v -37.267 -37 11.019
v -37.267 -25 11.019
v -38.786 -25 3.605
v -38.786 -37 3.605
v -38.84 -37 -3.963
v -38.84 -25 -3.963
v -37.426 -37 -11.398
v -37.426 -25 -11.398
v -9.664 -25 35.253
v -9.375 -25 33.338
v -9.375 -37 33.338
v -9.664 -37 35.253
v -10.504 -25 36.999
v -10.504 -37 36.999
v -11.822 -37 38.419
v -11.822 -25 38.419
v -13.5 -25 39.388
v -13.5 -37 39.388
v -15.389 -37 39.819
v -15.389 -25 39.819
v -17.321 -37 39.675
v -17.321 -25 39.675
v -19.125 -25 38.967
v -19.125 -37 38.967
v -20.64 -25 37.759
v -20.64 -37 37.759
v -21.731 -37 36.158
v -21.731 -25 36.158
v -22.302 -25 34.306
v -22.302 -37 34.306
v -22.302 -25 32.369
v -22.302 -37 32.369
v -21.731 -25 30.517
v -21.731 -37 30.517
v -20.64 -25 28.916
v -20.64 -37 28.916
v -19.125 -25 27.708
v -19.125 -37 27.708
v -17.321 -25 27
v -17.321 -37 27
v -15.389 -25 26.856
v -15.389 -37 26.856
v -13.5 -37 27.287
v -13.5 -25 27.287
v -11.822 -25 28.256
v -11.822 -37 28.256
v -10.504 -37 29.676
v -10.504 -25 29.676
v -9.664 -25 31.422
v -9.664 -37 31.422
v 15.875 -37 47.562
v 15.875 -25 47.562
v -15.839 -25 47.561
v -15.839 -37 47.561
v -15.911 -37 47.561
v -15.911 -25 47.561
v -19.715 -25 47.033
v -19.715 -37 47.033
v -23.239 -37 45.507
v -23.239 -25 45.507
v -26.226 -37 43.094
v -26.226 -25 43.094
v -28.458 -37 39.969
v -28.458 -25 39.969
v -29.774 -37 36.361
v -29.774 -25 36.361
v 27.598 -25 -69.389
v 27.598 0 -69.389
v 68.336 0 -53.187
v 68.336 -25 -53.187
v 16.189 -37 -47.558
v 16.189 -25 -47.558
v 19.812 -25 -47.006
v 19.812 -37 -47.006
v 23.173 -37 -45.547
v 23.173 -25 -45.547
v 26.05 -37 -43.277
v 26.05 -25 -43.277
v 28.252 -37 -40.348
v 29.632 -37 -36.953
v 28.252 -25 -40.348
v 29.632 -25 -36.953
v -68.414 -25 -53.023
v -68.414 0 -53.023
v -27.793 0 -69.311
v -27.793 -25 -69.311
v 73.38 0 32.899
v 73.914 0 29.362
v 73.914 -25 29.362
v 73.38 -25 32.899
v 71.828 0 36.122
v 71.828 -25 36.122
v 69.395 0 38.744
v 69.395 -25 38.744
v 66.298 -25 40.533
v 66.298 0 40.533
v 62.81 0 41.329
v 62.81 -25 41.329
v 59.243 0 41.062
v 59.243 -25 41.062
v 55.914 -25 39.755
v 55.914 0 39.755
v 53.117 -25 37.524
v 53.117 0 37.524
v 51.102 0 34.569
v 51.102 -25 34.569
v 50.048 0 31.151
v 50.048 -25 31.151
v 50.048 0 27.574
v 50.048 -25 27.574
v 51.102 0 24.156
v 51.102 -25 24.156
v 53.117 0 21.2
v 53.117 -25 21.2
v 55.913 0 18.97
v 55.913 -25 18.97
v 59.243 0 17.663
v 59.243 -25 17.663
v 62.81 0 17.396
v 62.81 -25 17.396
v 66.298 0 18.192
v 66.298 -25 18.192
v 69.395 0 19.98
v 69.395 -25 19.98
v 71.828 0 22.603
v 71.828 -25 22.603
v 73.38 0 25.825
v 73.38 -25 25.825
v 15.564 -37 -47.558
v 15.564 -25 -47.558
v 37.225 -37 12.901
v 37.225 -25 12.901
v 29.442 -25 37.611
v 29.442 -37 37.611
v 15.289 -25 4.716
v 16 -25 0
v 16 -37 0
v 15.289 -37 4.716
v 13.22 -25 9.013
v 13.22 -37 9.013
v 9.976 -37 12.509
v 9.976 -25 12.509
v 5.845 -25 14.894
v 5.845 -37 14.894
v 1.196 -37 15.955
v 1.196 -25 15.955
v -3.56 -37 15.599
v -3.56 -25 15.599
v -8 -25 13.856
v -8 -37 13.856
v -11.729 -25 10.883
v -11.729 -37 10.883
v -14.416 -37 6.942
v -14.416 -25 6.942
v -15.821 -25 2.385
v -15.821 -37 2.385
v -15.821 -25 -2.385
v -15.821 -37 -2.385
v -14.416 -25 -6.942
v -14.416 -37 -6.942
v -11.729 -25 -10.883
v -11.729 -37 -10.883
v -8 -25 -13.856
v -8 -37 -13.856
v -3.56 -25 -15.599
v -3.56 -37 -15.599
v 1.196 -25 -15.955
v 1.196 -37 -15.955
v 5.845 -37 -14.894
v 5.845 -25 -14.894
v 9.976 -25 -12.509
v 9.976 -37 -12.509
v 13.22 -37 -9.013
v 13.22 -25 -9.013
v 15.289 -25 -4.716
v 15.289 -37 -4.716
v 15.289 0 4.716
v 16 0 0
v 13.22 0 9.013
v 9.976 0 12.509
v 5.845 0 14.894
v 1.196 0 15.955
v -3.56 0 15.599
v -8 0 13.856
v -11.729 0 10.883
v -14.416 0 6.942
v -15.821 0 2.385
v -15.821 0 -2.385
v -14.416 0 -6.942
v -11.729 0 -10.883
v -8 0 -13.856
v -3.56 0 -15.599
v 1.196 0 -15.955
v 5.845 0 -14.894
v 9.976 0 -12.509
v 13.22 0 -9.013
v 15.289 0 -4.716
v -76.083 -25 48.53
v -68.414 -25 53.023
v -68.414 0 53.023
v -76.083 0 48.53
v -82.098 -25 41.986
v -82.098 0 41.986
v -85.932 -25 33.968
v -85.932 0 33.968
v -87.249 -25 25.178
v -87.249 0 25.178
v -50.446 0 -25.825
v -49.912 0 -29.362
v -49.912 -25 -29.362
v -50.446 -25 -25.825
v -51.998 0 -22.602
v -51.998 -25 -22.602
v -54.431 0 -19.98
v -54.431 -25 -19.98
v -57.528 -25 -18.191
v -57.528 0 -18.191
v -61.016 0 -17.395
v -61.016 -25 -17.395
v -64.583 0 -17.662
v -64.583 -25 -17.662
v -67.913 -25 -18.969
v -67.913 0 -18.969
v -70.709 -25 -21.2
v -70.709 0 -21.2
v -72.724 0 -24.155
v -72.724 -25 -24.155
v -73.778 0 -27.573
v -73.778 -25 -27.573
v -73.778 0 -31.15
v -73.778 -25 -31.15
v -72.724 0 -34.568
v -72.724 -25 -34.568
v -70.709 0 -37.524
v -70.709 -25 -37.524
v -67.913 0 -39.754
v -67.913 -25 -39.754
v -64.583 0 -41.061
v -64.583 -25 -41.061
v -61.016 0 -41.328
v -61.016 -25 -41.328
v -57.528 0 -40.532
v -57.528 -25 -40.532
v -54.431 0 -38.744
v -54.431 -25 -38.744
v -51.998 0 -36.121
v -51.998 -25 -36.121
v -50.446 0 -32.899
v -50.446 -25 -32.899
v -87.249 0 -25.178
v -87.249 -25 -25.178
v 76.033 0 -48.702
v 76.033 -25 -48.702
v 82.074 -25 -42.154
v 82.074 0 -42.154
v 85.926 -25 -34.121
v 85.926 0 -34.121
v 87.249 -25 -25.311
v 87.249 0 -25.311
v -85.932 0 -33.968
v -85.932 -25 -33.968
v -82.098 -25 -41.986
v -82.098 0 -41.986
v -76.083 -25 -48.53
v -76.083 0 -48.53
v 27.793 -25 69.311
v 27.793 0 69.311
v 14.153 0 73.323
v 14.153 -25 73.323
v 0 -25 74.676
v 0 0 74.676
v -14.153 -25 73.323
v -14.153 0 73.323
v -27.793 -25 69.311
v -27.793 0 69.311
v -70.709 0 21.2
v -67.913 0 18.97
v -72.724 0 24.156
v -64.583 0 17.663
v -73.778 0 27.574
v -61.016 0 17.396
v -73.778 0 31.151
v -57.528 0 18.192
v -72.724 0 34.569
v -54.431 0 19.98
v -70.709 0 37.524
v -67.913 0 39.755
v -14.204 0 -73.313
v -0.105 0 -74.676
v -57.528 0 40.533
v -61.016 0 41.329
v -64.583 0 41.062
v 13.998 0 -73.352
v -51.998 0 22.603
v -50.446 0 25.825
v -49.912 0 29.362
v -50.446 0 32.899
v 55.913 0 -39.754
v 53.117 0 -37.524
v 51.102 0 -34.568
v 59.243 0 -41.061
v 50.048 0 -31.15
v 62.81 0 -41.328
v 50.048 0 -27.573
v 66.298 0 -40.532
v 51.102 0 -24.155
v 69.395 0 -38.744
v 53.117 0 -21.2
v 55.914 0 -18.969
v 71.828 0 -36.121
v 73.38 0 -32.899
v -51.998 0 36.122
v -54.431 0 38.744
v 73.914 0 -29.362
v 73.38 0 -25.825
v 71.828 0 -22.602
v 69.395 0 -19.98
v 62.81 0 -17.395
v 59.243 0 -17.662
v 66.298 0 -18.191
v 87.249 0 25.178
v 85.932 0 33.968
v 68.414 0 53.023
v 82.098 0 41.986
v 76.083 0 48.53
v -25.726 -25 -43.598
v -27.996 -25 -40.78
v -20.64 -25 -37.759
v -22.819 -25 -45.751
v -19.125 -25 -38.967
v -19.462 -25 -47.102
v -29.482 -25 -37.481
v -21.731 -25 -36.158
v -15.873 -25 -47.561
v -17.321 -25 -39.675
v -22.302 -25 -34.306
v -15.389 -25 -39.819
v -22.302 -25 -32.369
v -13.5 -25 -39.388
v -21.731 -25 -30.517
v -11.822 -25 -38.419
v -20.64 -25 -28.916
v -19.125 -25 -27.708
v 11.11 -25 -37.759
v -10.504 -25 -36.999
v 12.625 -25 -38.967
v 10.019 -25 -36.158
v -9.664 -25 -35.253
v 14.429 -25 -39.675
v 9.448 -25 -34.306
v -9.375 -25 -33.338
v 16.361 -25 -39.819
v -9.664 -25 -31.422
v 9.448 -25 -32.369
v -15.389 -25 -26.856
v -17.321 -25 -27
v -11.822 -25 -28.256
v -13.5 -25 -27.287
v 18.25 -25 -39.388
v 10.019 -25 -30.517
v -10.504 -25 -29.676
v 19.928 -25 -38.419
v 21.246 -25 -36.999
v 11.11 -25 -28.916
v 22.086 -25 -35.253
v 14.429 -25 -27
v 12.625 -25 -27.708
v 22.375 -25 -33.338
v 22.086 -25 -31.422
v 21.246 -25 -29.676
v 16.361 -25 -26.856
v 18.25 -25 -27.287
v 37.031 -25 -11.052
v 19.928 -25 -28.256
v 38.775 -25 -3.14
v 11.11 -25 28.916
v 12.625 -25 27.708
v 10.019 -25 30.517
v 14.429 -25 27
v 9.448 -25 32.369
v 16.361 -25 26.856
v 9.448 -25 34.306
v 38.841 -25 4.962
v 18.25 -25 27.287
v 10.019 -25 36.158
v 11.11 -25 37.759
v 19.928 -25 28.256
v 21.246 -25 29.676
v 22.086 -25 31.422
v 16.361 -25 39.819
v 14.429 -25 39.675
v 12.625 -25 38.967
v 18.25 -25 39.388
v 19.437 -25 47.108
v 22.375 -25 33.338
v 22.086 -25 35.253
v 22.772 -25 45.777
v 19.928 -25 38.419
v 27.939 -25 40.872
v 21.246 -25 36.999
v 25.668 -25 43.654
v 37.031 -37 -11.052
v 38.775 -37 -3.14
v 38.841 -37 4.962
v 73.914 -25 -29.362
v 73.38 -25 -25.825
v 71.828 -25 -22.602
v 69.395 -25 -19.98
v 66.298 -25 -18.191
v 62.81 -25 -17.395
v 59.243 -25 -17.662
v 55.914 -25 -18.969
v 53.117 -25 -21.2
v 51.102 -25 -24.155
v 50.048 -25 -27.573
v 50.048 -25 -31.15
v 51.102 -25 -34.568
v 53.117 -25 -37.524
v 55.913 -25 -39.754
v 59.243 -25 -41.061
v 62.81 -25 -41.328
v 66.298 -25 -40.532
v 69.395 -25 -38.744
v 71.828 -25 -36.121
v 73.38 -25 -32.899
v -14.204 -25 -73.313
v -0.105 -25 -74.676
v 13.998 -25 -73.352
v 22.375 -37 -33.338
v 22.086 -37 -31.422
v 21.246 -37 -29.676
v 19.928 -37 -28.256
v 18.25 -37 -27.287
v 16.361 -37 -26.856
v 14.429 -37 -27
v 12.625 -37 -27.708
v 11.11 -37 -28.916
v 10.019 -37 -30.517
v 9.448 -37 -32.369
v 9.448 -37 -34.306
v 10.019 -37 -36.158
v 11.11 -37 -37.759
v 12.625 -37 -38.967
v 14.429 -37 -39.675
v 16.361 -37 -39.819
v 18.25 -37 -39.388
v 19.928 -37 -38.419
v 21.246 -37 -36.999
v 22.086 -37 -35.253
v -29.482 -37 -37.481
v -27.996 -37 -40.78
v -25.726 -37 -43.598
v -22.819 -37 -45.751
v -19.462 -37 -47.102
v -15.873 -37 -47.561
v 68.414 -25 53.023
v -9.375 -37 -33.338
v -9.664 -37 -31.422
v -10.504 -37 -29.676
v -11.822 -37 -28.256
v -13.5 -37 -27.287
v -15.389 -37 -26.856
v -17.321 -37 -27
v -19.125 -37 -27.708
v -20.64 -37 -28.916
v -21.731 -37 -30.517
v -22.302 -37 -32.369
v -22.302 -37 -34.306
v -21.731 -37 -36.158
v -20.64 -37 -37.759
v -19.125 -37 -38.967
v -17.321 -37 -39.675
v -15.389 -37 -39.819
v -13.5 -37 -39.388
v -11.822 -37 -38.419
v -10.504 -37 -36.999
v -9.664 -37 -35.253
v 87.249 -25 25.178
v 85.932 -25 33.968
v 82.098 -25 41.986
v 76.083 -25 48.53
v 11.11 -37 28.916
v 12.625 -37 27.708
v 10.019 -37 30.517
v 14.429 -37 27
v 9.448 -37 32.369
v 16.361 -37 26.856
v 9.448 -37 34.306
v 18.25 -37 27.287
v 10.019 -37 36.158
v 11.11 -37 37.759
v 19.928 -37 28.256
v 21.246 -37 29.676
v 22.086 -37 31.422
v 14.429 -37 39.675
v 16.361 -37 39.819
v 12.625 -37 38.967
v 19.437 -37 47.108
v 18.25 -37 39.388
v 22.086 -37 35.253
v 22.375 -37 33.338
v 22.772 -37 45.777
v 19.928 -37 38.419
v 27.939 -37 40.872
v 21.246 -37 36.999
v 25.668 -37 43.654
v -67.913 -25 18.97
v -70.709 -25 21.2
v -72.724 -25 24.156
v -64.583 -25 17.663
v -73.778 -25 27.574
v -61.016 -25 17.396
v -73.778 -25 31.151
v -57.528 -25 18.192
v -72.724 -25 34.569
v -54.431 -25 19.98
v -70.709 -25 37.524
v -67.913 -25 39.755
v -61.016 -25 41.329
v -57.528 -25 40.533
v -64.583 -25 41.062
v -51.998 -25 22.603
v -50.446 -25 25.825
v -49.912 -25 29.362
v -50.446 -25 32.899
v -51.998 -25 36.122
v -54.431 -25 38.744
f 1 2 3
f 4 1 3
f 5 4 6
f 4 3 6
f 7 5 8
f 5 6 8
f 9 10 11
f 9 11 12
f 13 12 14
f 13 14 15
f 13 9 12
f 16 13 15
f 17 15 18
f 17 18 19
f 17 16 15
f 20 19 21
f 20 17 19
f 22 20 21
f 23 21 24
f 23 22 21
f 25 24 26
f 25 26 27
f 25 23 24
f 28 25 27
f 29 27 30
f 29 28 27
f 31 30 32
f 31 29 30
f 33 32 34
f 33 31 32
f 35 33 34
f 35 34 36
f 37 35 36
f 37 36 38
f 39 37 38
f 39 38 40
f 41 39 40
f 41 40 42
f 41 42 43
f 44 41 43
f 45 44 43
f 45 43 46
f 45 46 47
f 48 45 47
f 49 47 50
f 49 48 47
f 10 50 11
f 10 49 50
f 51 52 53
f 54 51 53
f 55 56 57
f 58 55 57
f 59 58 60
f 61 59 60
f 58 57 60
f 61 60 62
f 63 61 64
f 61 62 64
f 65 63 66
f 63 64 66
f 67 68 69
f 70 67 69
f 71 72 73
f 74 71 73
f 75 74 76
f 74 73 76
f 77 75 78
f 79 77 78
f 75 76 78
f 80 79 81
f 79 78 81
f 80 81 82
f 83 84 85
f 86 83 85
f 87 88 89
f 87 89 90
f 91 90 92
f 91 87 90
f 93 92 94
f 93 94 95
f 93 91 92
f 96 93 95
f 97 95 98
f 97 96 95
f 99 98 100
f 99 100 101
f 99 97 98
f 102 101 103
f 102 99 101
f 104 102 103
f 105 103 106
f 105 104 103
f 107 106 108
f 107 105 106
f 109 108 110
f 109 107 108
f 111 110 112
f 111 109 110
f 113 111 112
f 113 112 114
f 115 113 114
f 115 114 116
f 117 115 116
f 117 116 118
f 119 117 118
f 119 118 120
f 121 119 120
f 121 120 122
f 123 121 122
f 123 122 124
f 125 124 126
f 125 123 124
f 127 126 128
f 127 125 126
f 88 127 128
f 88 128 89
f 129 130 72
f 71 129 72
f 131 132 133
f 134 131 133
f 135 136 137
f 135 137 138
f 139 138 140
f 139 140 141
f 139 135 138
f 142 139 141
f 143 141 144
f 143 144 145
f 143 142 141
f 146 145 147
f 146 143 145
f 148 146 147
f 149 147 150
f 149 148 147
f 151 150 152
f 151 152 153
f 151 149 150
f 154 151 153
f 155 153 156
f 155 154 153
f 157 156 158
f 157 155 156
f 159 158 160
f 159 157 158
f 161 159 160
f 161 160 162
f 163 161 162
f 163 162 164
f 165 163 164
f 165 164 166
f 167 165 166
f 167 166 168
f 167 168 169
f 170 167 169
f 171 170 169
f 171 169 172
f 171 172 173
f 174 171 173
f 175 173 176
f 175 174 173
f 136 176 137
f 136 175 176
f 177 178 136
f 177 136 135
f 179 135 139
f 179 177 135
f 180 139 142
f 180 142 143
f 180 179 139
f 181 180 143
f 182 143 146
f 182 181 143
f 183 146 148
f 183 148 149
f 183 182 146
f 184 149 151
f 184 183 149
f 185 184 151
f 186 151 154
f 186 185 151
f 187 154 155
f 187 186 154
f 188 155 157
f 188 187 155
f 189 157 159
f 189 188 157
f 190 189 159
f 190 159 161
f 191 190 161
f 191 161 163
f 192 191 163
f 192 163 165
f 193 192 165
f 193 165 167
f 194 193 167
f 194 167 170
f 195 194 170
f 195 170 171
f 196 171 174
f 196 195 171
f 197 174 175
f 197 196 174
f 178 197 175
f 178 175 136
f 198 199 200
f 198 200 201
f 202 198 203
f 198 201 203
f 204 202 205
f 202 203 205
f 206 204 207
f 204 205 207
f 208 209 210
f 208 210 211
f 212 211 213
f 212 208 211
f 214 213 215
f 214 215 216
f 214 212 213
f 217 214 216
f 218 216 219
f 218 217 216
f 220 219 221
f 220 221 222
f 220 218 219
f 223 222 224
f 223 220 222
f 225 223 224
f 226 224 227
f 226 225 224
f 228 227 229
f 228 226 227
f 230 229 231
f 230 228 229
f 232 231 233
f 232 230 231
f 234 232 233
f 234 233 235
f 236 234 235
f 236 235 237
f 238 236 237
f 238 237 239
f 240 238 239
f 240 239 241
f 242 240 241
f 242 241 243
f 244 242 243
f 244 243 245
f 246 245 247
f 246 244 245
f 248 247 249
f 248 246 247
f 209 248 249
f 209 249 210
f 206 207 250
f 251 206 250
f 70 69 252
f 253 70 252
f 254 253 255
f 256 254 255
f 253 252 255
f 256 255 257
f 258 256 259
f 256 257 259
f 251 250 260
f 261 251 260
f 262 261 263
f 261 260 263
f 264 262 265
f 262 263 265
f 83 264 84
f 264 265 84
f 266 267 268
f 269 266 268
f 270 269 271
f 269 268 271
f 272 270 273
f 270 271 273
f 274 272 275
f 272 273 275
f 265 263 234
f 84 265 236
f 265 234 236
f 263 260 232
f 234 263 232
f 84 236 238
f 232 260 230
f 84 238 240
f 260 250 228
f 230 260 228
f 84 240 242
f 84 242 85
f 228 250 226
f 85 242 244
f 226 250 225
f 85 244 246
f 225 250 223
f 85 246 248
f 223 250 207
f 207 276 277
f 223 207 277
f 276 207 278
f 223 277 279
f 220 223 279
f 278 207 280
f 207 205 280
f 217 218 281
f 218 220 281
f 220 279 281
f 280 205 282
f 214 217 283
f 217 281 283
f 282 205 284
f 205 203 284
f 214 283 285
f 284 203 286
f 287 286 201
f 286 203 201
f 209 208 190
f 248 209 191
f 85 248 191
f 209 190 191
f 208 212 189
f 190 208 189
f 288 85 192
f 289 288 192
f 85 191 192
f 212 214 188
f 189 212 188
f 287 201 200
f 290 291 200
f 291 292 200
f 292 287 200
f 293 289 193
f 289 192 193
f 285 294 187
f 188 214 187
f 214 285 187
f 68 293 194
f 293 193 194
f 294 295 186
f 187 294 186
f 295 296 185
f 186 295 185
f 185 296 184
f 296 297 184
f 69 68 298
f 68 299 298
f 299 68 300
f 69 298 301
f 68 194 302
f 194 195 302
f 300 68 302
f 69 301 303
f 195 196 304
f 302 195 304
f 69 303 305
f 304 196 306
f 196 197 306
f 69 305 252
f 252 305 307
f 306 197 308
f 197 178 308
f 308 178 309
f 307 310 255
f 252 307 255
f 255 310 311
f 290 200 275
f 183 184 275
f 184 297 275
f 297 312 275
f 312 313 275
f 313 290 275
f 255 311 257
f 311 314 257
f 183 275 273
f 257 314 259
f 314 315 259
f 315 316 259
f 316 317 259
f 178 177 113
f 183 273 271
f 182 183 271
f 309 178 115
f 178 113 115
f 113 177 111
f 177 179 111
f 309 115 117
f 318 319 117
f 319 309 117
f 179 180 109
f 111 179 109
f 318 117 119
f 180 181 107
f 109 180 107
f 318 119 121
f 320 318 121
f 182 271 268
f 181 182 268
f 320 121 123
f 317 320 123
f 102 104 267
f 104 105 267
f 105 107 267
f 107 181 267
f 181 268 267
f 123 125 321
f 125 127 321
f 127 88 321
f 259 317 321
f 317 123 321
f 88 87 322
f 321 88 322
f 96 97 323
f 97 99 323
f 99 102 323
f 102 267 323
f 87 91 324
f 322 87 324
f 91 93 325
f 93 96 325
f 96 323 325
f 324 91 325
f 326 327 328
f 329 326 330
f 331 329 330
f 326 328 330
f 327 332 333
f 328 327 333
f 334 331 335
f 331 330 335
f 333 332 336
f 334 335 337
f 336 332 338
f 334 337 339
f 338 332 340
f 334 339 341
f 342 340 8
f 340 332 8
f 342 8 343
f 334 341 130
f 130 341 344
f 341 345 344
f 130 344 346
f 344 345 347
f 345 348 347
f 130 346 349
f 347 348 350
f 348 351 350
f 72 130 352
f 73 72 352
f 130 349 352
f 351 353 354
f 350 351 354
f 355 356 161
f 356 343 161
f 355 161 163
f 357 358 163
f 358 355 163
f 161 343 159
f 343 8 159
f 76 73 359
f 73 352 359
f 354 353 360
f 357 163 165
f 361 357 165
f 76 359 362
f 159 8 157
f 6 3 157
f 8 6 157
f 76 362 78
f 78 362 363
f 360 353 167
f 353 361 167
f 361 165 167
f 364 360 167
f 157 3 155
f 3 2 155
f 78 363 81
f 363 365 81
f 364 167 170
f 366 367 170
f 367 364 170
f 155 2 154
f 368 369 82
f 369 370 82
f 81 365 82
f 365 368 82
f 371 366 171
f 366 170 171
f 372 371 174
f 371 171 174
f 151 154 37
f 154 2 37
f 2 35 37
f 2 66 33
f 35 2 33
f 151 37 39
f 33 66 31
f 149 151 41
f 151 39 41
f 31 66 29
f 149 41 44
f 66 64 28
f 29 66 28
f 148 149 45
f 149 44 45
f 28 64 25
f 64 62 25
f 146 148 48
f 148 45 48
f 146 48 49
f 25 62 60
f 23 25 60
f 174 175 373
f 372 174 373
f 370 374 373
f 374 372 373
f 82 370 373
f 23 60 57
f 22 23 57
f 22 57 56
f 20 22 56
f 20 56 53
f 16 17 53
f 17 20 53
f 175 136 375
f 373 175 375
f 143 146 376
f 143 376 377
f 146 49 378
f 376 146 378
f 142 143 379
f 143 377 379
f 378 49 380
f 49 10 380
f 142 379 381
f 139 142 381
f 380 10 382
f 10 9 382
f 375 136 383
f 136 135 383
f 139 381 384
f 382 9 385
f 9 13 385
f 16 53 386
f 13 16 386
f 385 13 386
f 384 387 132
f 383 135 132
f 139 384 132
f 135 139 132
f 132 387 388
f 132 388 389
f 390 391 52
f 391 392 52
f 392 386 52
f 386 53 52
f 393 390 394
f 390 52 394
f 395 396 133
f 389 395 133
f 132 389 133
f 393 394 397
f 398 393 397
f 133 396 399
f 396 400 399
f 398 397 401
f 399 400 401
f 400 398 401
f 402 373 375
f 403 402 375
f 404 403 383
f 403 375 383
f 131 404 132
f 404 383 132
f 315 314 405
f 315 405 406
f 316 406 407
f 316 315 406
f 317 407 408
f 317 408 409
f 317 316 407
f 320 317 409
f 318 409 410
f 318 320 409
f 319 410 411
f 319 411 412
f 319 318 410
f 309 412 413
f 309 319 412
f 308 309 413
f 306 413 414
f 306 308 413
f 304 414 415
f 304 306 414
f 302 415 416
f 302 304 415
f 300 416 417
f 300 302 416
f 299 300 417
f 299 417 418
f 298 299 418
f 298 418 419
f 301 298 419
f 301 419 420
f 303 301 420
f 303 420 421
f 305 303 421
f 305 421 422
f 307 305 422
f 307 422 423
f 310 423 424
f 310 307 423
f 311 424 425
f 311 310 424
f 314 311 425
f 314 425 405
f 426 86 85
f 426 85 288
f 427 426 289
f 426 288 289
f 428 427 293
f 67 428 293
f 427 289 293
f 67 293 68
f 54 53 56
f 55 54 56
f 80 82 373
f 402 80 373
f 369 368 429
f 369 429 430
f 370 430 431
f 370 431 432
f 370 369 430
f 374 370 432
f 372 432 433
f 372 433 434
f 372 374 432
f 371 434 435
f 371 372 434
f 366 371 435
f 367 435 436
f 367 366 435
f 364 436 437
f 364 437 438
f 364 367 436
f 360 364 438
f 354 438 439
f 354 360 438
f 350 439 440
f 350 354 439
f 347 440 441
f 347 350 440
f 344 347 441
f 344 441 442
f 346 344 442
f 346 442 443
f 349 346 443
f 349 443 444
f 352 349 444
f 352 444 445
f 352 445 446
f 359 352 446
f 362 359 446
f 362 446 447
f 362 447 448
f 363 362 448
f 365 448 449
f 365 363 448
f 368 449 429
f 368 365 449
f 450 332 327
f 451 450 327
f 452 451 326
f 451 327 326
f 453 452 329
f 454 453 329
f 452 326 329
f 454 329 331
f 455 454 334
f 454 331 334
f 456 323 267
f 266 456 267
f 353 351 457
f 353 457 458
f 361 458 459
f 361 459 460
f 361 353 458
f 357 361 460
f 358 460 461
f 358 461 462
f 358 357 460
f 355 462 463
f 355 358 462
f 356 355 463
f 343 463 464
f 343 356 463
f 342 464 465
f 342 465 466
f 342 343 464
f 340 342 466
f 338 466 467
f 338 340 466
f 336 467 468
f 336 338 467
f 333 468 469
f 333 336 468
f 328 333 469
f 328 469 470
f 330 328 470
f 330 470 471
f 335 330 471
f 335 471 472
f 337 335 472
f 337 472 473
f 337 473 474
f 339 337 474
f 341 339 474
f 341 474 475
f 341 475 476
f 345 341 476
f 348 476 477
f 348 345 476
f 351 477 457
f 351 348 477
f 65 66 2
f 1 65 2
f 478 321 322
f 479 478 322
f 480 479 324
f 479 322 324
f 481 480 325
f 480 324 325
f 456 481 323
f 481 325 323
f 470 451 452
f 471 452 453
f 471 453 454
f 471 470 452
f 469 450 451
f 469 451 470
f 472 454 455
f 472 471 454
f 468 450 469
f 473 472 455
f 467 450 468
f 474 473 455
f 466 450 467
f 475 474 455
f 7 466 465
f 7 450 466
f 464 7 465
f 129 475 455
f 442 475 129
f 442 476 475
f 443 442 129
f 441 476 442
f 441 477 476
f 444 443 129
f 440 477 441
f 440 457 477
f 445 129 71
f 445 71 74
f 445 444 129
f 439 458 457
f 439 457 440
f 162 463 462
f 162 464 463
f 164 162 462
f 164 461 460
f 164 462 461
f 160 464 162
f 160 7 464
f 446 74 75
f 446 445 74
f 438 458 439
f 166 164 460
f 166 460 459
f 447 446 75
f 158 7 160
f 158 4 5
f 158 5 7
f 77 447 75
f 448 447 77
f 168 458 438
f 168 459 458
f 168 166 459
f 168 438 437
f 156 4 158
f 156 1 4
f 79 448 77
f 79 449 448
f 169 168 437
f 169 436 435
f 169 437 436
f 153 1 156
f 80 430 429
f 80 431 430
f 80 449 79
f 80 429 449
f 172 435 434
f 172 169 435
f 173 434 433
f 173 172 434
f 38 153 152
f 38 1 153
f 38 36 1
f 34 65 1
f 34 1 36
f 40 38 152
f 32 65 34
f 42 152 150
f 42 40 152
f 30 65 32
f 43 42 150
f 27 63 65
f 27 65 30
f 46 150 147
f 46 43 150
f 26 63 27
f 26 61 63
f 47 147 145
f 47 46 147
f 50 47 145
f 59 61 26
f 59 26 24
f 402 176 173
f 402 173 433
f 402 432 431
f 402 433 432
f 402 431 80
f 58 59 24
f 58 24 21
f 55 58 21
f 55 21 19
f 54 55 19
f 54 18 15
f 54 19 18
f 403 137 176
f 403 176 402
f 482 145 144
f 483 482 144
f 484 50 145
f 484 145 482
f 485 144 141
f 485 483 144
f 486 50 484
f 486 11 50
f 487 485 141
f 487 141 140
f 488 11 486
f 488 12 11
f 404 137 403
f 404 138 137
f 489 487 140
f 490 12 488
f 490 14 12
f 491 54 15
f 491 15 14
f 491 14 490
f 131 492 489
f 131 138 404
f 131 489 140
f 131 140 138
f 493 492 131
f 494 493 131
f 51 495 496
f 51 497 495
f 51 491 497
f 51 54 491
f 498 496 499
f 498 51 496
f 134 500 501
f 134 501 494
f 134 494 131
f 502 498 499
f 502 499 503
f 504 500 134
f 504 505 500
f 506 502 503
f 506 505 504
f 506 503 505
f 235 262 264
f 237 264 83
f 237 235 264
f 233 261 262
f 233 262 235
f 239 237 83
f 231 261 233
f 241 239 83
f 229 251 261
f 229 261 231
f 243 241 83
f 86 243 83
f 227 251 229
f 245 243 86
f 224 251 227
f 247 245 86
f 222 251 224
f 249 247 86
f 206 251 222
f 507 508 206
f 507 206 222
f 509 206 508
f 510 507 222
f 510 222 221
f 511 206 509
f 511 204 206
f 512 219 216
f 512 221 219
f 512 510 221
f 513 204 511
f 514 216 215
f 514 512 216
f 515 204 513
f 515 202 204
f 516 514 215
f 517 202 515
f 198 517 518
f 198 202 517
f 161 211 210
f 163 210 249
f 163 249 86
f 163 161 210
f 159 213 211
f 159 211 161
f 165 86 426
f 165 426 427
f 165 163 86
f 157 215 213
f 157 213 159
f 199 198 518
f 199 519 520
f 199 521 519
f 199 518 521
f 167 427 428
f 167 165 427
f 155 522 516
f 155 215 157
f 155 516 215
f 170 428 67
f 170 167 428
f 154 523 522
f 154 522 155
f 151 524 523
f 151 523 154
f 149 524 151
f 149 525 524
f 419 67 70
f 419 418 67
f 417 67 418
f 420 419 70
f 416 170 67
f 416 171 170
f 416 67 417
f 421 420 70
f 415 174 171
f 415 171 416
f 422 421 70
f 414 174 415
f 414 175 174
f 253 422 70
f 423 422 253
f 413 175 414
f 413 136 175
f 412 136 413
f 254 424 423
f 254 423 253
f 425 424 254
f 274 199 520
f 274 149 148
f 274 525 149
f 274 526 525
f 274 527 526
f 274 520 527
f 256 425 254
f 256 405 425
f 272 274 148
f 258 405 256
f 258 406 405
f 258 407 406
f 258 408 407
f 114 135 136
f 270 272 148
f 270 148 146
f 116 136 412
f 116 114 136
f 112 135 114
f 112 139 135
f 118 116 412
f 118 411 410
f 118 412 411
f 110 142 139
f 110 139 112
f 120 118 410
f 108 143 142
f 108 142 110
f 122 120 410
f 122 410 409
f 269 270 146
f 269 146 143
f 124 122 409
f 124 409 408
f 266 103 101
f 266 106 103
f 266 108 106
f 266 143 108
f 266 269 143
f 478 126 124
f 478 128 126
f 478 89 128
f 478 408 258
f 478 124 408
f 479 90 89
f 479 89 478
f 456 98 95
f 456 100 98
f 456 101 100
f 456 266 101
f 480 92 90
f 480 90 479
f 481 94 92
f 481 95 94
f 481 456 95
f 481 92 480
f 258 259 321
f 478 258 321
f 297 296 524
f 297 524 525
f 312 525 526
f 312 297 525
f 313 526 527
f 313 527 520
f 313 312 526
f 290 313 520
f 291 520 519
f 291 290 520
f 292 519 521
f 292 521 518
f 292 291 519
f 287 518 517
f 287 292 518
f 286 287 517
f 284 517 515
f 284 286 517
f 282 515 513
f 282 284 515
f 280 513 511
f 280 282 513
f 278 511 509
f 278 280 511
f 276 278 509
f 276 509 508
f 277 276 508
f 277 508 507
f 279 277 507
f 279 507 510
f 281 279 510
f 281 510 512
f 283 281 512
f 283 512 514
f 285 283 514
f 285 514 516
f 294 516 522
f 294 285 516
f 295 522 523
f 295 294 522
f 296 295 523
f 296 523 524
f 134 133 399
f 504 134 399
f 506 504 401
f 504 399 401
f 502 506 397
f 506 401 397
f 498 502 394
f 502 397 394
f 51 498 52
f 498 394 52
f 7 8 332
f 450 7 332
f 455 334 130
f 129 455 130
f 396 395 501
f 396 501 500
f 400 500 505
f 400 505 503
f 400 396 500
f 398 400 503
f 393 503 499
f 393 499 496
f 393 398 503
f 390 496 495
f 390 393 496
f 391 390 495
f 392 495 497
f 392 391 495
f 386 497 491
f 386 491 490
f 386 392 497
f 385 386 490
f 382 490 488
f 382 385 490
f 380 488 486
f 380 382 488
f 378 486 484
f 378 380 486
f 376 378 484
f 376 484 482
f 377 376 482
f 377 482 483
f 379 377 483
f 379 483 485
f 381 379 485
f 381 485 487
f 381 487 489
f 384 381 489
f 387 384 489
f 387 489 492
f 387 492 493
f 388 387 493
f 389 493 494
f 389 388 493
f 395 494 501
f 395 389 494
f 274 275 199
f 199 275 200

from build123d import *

# Parameters (mm, degrees)
F0_R     = 12
F0_R_2   = 16
F1_DEPTH = 25
F2_R     = 6.5
F2_R_2   = 16
F3_DEPTH = 12


with BuildPart() as f1:
    # F0 (on Front) → F1 (new body)
    with BuildSketch(Plane.XZ):
        with BuildLine():
            Line((-87.249, 25.178074), (-87.249, -25.178074))
            ThreePointArc((-87.249, -25.178074), (-82.098121, -41.986441), (-68.414255, -53.02295))
            Line((-68.414255, -53.02295), (-27.792552, -69.311464))
            ThreePointArc((-27.792552, -69.311464), (-0.104916, -74.675926), (27.597685, -69.389284))
            Line((27.597685, -69.389284), (68.33597, -53.186749))
            ThreePointArc((68.33597, -53.186749), (82.074482, -42.153872), (87.249, -25.31061))
            Line((87.249, -25.31061), (87.249, 25.178074))
            ThreePointArc((87.249, 25.178074), (82.098121, 41.986441), (68.414255, 53.02295))
            Line((68.414255, 53.02295), (27.792552, 69.311464))
            ThreePointArc((27.792552, 69.311464), (0, 74.676), (-27.792552, 69.311464))
            Line((-27.792552, 69.311464), (-68.414255, 53.02295))
            ThreePointArc((-68.414255, 53.02295), (-82.098121, 41.986441), (-87.249, 25.178074))
        make_face()
        with Locations((-61.9125, -29.3616)):
            Circle(F0_R, mode=Mode.SUBTRACT)
        with Locations((61.9135, -29.3616)):
            Circle(F0_R, mode=Mode.SUBTRACT)
        with Locations((-61.9125, 29.3624)):
            Circle(F0_R, mode=Mode.SUBTRACT)
        Circle(F0_R_2, mode=Mode.SUBTRACT)
        with Locations((61.9135, 29.3624)):
            Circle(F0_R, mode=Mode.SUBTRACT)
    extrude(amount=F1_DEPTH)


with BuildPart() as f3:
    # F2 (on face) → F3 (new body)
    with BuildSketch(Plane.XZ.offset(25)):
        with BuildLine():
            Line((-37.425588, -11.397668), (-29.481993, -37.481402))
            ThreePointArc((-29.481993, -37.481402), (-24.341356, -44.767417), (-15.873461, -47.5615))
            Line((-15.873461, -47.5615), (15.563904, -47.558098))
            Line((15.563904, -47.558098), (16.189174, -47.55803))
            ThreePointArc((16.189174, -47.55803), (24.684946, -44.50473), (29.631836, -36.952971))
            Line((29.631836, -36.952971), (37.030543, -11.051606))
            ThreePointArc((37.030543, -11.051606), (39.019338, 0.909089), (37.225295, 12.900542))
            Line((37.225295, 12.900542), (29.441887, 37.610878))
            ThreePointArc((29.441887, 37.610878), (24.287412, 44.807177), (15.87498, 47.5615))
            Line((15.87498, 47.5615), (-15.839058, 47.561455))
            Line((-15.839058, 47.561455), (-15.910983, 47.561454))
            ThreePointArc((-15.910983, 47.561454), (-24.814089, 44.401625), (-29.773919, 36.36111))
            Line((-29.773919, 36.36111), (-37.267052, 11.019159))
            ThreePointArc((-37.267052, 11.019159), (-38.997794, -0.177575), (-37.425588, -11.397668))
        make_face()
        with Locations((-15.875, -33.3375)):
            Circle(F2_R, mode=Mode.SUBTRACT)
        with Locations((15.875, -33.3375)):
            Circle(F2_R, mode=Mode.SUBTRACT)
        with Locations((-15.875, 33.3375)):
            Circle(F2_R, mode=Mode.SUBTRACT)
        Circle(F2_R_2, mode=Mode.SUBTRACT)
        with Locations((15.875, 33.3375)):
            Circle(F2_R, mode=Mode.SUBTRACT)
    extrude(amount=F3_DEPTH)


solid = Compound([f1.part, f3.part])
